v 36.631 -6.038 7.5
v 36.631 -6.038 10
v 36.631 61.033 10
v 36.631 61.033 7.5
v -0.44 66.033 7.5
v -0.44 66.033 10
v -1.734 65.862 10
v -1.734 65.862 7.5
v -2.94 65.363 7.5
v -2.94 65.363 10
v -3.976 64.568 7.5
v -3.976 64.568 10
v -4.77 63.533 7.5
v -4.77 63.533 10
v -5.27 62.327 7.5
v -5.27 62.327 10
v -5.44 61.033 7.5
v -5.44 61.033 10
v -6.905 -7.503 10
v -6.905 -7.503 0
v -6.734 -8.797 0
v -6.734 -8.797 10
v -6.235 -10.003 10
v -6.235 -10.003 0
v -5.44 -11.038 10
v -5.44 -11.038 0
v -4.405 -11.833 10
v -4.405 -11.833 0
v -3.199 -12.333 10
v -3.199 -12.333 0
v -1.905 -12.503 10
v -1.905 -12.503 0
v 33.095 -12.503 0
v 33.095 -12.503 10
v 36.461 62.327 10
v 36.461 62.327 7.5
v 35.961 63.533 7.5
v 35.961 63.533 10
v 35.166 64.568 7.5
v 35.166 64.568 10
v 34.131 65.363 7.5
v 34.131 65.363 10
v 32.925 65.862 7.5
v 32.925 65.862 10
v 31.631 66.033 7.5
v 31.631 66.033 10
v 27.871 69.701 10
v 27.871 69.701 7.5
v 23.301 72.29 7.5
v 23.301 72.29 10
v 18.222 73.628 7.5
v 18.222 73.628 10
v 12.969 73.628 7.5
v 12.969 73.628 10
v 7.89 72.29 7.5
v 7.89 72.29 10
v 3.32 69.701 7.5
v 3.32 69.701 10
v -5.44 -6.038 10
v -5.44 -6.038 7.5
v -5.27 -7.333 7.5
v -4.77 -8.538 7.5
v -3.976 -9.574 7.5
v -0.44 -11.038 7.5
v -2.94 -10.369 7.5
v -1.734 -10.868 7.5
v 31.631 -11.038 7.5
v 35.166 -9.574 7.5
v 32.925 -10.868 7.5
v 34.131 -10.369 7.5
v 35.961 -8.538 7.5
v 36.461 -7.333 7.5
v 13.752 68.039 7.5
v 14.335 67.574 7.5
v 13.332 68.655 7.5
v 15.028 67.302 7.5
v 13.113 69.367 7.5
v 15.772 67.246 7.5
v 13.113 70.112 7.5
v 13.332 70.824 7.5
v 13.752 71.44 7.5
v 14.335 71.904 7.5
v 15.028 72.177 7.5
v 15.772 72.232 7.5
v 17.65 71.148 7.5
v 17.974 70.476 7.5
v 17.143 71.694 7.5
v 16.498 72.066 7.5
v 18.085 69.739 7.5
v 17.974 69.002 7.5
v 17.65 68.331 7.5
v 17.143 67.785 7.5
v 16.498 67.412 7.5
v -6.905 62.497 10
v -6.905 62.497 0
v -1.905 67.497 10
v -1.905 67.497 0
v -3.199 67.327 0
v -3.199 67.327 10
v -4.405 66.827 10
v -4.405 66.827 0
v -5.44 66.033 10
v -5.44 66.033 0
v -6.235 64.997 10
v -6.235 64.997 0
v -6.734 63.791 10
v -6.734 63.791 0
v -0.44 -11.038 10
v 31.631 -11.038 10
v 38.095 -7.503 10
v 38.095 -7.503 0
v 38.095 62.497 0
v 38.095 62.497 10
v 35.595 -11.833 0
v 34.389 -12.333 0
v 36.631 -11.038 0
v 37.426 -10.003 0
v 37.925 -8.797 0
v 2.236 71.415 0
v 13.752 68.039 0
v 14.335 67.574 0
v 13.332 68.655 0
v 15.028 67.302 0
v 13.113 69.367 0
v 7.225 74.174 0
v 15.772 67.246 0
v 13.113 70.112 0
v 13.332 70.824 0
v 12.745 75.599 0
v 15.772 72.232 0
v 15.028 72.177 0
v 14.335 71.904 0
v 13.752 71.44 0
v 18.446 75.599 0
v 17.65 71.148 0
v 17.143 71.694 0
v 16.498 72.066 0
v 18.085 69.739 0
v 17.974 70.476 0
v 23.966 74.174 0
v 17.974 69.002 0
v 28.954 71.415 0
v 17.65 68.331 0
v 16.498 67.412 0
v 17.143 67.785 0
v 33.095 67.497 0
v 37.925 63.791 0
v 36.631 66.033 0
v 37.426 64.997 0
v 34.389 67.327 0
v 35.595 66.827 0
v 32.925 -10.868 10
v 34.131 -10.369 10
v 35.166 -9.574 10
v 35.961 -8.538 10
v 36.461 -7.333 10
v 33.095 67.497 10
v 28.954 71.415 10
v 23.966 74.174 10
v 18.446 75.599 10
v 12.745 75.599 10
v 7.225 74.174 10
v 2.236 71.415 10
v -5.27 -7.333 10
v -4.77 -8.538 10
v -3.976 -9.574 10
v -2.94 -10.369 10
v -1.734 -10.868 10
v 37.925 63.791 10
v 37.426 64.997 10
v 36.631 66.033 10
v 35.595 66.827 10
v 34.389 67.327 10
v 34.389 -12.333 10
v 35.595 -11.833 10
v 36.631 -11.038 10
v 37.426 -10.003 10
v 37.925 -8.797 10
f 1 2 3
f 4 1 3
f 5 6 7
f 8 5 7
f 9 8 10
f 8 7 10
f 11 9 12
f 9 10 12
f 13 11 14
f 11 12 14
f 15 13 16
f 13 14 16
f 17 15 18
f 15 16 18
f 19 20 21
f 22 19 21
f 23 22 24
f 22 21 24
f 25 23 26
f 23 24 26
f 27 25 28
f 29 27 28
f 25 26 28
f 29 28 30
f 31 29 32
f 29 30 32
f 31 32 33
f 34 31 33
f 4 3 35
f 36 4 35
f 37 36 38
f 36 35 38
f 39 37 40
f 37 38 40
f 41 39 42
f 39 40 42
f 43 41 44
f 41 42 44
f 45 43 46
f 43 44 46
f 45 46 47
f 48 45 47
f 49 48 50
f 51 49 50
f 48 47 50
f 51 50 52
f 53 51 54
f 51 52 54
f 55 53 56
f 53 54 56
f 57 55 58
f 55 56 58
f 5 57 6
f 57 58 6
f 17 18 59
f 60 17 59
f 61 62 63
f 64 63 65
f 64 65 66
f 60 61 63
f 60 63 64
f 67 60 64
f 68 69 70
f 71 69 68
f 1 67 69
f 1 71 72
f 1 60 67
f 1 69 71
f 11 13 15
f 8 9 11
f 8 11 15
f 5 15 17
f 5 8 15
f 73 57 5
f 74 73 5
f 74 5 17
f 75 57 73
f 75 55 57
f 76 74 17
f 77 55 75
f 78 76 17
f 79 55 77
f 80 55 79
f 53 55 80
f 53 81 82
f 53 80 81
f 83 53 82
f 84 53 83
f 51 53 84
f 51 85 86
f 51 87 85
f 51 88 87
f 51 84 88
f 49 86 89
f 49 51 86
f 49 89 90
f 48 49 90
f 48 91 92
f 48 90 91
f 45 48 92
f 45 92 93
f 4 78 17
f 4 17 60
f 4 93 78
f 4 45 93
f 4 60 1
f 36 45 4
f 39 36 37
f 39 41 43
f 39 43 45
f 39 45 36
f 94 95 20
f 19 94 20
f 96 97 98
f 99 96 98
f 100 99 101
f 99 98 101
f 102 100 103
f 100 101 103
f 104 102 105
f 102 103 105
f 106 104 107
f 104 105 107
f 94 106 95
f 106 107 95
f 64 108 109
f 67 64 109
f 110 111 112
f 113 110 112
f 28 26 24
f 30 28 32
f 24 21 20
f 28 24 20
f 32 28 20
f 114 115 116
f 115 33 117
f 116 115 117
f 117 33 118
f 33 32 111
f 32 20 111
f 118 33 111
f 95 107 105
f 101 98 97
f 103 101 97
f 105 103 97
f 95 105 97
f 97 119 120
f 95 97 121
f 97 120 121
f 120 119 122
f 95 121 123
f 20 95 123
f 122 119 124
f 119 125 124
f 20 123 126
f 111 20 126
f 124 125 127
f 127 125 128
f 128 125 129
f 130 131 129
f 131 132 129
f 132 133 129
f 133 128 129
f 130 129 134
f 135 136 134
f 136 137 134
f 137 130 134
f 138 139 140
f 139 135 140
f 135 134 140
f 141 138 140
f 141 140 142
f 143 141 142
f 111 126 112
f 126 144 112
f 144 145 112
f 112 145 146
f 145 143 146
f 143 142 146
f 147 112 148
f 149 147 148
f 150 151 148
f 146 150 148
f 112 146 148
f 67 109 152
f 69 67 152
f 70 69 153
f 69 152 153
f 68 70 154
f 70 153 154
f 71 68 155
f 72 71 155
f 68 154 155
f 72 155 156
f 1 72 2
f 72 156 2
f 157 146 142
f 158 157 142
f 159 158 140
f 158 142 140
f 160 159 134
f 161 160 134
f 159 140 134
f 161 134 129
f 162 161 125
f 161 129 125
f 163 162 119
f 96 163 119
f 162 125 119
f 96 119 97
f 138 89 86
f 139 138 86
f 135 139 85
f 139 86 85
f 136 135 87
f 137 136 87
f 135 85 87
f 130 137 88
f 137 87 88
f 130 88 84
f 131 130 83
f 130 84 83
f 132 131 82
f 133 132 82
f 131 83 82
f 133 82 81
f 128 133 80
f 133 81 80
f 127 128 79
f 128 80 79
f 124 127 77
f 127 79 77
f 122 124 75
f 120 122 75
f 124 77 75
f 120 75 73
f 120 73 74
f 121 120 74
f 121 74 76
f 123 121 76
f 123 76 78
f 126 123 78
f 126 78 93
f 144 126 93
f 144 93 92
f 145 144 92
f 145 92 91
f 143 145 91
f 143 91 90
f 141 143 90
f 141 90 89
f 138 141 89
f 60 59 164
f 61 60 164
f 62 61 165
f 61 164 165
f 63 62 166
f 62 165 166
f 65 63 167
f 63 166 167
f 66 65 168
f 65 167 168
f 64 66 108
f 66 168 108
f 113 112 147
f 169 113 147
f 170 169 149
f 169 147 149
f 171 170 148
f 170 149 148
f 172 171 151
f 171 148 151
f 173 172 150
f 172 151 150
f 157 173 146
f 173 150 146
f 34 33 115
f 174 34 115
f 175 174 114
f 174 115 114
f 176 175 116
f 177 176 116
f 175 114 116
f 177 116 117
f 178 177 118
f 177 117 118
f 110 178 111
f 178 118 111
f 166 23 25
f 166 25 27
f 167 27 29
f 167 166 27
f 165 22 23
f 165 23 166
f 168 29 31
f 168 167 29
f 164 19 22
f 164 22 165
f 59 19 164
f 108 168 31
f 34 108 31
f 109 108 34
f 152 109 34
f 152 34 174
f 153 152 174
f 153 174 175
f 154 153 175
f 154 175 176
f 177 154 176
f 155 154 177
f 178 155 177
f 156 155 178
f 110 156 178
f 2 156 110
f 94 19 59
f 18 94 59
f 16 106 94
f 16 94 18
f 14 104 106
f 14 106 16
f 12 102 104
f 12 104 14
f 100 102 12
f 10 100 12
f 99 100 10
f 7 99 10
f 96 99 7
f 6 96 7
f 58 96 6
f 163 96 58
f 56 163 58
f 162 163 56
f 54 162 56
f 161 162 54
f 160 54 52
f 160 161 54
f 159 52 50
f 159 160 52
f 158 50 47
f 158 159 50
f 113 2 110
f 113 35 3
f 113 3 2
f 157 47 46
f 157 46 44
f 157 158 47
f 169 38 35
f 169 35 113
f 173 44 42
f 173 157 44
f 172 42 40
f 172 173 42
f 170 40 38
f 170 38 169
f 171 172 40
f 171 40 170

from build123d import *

# Parameters (mm, degrees)
F1_DEPTH = 10
F2_R     = 2.5
F3_DEPTH = 2.5
F4_DEPTH = 40.9


with BuildPart() as f1:
    # F0 (on Top) → F1 (new body)
    with BuildSketch(Plane.XY):
        with BuildLine():
            ThreePointArc((33.0953783914, 67.4970372766), (15.5953783914, 75.7789746896), (-1.9046216086, 67.4970372766))
            Line((-1.9046216086, 67.4970372766), (33.0953783914, 67.4970372766))
        make_face()
        with BuildLine():
            ThreePointArc((-6.9046216086, -7.5029627234), (-5.4401555145, -11.0384966293), (-1.9046216086, -12.5029627234))
            Line((-1.9046216086, -12.5029627234), (33.0953783914, -12.5029627234))
            ThreePointArc((33.0953783914, -12.5029627234), (36.6309122974, -11.0384966293), (38.0953783914, -7.5029627234))
            Line((38.0953783914, -7.5029627234), (38.0953783914, 62.4970372766))
            ThreePointArc((38.0953783914, 62.4970372766), (36.6309122974, 66.0325711826), (33.0953783914, 67.4970372766))
            Line((33.0953783914, 67.4970372766), (-1.9046216086, 67.4970372766))
            ThreePointArc((-1.9046216086, 67.4970372766), (-5.4401555145, 66.0325711826), (-6.9046216086, 62.4970372766))
            Line((-6.9046216086, 62.4970372766), (-6.9046216086, -7.5029627234))
        make_face()
    extrude(amount=F1_DEPTH)

    # F2 (on face) → F3 (cut)
    with BuildSketch(Plane.XY.offset(10)):
        with BuildLine():
            ThreePointArc((31.6309122974, 66.0325711826), (15.5953783914, 73.7975858827), (-0.4401555145, 66.0325711826))
            Line((-0.4401555145, 66.0325711826), (31.6309122974, 66.0325711826))
        make_face()
        with Locations((15.5847426504, 69.739215076)):
            Circle(F2_R, mode=Mode.SUBTRACT)
        with BuildLine():
            ThreePointArc((-5.4401555145, -6.0384966293), (-3.9756894204, -9.5740305352), (-0.4401555145, -11.0384966293))
            Line((-0.4401555145, -11.0384966293), (31.6309122974, -11.0384966293))
            ThreePointArc((31.6309122974, -11.0384966293), (35.1664462033, -9.5740305352), (36.6309122974, -6.0384966293))
            Line((36.6309122974, -6.0384966293), (36.6309122974, 61.0325711826))
            ThreePointArc((36.6309122974, 61.0325711826), (35.1664462033, 64.5681050885), (31.6309122974, 66.0325711826))
            Line((31.6309122974, 66.0325711826), (-0.4401555145, 66.0325711826))
            ThreePointArc((-0.4401555145, 66.0325711826), (-3.9756894204, 64.5681050885), (-5.4401555145, 61.0325711826))
            Line((-5.4401555145, 61.0325711826), (-5.4401555145, -6.0384966293))
        make_face()
    extrude(amount=-F3_DEPTH, mode=Mode.SUBTRACT)

    # F4 (cut): a face of the model
    f4_faces = [f1.faces().sort_by_distance(p)[0] for p in [
        (15.5847426504, 69.739215076, 10),
    ]]
    extrude(f4_faces, amount=-F4_DEPTH, mode=Mode.SUBTRACT)


solid = f1.part
